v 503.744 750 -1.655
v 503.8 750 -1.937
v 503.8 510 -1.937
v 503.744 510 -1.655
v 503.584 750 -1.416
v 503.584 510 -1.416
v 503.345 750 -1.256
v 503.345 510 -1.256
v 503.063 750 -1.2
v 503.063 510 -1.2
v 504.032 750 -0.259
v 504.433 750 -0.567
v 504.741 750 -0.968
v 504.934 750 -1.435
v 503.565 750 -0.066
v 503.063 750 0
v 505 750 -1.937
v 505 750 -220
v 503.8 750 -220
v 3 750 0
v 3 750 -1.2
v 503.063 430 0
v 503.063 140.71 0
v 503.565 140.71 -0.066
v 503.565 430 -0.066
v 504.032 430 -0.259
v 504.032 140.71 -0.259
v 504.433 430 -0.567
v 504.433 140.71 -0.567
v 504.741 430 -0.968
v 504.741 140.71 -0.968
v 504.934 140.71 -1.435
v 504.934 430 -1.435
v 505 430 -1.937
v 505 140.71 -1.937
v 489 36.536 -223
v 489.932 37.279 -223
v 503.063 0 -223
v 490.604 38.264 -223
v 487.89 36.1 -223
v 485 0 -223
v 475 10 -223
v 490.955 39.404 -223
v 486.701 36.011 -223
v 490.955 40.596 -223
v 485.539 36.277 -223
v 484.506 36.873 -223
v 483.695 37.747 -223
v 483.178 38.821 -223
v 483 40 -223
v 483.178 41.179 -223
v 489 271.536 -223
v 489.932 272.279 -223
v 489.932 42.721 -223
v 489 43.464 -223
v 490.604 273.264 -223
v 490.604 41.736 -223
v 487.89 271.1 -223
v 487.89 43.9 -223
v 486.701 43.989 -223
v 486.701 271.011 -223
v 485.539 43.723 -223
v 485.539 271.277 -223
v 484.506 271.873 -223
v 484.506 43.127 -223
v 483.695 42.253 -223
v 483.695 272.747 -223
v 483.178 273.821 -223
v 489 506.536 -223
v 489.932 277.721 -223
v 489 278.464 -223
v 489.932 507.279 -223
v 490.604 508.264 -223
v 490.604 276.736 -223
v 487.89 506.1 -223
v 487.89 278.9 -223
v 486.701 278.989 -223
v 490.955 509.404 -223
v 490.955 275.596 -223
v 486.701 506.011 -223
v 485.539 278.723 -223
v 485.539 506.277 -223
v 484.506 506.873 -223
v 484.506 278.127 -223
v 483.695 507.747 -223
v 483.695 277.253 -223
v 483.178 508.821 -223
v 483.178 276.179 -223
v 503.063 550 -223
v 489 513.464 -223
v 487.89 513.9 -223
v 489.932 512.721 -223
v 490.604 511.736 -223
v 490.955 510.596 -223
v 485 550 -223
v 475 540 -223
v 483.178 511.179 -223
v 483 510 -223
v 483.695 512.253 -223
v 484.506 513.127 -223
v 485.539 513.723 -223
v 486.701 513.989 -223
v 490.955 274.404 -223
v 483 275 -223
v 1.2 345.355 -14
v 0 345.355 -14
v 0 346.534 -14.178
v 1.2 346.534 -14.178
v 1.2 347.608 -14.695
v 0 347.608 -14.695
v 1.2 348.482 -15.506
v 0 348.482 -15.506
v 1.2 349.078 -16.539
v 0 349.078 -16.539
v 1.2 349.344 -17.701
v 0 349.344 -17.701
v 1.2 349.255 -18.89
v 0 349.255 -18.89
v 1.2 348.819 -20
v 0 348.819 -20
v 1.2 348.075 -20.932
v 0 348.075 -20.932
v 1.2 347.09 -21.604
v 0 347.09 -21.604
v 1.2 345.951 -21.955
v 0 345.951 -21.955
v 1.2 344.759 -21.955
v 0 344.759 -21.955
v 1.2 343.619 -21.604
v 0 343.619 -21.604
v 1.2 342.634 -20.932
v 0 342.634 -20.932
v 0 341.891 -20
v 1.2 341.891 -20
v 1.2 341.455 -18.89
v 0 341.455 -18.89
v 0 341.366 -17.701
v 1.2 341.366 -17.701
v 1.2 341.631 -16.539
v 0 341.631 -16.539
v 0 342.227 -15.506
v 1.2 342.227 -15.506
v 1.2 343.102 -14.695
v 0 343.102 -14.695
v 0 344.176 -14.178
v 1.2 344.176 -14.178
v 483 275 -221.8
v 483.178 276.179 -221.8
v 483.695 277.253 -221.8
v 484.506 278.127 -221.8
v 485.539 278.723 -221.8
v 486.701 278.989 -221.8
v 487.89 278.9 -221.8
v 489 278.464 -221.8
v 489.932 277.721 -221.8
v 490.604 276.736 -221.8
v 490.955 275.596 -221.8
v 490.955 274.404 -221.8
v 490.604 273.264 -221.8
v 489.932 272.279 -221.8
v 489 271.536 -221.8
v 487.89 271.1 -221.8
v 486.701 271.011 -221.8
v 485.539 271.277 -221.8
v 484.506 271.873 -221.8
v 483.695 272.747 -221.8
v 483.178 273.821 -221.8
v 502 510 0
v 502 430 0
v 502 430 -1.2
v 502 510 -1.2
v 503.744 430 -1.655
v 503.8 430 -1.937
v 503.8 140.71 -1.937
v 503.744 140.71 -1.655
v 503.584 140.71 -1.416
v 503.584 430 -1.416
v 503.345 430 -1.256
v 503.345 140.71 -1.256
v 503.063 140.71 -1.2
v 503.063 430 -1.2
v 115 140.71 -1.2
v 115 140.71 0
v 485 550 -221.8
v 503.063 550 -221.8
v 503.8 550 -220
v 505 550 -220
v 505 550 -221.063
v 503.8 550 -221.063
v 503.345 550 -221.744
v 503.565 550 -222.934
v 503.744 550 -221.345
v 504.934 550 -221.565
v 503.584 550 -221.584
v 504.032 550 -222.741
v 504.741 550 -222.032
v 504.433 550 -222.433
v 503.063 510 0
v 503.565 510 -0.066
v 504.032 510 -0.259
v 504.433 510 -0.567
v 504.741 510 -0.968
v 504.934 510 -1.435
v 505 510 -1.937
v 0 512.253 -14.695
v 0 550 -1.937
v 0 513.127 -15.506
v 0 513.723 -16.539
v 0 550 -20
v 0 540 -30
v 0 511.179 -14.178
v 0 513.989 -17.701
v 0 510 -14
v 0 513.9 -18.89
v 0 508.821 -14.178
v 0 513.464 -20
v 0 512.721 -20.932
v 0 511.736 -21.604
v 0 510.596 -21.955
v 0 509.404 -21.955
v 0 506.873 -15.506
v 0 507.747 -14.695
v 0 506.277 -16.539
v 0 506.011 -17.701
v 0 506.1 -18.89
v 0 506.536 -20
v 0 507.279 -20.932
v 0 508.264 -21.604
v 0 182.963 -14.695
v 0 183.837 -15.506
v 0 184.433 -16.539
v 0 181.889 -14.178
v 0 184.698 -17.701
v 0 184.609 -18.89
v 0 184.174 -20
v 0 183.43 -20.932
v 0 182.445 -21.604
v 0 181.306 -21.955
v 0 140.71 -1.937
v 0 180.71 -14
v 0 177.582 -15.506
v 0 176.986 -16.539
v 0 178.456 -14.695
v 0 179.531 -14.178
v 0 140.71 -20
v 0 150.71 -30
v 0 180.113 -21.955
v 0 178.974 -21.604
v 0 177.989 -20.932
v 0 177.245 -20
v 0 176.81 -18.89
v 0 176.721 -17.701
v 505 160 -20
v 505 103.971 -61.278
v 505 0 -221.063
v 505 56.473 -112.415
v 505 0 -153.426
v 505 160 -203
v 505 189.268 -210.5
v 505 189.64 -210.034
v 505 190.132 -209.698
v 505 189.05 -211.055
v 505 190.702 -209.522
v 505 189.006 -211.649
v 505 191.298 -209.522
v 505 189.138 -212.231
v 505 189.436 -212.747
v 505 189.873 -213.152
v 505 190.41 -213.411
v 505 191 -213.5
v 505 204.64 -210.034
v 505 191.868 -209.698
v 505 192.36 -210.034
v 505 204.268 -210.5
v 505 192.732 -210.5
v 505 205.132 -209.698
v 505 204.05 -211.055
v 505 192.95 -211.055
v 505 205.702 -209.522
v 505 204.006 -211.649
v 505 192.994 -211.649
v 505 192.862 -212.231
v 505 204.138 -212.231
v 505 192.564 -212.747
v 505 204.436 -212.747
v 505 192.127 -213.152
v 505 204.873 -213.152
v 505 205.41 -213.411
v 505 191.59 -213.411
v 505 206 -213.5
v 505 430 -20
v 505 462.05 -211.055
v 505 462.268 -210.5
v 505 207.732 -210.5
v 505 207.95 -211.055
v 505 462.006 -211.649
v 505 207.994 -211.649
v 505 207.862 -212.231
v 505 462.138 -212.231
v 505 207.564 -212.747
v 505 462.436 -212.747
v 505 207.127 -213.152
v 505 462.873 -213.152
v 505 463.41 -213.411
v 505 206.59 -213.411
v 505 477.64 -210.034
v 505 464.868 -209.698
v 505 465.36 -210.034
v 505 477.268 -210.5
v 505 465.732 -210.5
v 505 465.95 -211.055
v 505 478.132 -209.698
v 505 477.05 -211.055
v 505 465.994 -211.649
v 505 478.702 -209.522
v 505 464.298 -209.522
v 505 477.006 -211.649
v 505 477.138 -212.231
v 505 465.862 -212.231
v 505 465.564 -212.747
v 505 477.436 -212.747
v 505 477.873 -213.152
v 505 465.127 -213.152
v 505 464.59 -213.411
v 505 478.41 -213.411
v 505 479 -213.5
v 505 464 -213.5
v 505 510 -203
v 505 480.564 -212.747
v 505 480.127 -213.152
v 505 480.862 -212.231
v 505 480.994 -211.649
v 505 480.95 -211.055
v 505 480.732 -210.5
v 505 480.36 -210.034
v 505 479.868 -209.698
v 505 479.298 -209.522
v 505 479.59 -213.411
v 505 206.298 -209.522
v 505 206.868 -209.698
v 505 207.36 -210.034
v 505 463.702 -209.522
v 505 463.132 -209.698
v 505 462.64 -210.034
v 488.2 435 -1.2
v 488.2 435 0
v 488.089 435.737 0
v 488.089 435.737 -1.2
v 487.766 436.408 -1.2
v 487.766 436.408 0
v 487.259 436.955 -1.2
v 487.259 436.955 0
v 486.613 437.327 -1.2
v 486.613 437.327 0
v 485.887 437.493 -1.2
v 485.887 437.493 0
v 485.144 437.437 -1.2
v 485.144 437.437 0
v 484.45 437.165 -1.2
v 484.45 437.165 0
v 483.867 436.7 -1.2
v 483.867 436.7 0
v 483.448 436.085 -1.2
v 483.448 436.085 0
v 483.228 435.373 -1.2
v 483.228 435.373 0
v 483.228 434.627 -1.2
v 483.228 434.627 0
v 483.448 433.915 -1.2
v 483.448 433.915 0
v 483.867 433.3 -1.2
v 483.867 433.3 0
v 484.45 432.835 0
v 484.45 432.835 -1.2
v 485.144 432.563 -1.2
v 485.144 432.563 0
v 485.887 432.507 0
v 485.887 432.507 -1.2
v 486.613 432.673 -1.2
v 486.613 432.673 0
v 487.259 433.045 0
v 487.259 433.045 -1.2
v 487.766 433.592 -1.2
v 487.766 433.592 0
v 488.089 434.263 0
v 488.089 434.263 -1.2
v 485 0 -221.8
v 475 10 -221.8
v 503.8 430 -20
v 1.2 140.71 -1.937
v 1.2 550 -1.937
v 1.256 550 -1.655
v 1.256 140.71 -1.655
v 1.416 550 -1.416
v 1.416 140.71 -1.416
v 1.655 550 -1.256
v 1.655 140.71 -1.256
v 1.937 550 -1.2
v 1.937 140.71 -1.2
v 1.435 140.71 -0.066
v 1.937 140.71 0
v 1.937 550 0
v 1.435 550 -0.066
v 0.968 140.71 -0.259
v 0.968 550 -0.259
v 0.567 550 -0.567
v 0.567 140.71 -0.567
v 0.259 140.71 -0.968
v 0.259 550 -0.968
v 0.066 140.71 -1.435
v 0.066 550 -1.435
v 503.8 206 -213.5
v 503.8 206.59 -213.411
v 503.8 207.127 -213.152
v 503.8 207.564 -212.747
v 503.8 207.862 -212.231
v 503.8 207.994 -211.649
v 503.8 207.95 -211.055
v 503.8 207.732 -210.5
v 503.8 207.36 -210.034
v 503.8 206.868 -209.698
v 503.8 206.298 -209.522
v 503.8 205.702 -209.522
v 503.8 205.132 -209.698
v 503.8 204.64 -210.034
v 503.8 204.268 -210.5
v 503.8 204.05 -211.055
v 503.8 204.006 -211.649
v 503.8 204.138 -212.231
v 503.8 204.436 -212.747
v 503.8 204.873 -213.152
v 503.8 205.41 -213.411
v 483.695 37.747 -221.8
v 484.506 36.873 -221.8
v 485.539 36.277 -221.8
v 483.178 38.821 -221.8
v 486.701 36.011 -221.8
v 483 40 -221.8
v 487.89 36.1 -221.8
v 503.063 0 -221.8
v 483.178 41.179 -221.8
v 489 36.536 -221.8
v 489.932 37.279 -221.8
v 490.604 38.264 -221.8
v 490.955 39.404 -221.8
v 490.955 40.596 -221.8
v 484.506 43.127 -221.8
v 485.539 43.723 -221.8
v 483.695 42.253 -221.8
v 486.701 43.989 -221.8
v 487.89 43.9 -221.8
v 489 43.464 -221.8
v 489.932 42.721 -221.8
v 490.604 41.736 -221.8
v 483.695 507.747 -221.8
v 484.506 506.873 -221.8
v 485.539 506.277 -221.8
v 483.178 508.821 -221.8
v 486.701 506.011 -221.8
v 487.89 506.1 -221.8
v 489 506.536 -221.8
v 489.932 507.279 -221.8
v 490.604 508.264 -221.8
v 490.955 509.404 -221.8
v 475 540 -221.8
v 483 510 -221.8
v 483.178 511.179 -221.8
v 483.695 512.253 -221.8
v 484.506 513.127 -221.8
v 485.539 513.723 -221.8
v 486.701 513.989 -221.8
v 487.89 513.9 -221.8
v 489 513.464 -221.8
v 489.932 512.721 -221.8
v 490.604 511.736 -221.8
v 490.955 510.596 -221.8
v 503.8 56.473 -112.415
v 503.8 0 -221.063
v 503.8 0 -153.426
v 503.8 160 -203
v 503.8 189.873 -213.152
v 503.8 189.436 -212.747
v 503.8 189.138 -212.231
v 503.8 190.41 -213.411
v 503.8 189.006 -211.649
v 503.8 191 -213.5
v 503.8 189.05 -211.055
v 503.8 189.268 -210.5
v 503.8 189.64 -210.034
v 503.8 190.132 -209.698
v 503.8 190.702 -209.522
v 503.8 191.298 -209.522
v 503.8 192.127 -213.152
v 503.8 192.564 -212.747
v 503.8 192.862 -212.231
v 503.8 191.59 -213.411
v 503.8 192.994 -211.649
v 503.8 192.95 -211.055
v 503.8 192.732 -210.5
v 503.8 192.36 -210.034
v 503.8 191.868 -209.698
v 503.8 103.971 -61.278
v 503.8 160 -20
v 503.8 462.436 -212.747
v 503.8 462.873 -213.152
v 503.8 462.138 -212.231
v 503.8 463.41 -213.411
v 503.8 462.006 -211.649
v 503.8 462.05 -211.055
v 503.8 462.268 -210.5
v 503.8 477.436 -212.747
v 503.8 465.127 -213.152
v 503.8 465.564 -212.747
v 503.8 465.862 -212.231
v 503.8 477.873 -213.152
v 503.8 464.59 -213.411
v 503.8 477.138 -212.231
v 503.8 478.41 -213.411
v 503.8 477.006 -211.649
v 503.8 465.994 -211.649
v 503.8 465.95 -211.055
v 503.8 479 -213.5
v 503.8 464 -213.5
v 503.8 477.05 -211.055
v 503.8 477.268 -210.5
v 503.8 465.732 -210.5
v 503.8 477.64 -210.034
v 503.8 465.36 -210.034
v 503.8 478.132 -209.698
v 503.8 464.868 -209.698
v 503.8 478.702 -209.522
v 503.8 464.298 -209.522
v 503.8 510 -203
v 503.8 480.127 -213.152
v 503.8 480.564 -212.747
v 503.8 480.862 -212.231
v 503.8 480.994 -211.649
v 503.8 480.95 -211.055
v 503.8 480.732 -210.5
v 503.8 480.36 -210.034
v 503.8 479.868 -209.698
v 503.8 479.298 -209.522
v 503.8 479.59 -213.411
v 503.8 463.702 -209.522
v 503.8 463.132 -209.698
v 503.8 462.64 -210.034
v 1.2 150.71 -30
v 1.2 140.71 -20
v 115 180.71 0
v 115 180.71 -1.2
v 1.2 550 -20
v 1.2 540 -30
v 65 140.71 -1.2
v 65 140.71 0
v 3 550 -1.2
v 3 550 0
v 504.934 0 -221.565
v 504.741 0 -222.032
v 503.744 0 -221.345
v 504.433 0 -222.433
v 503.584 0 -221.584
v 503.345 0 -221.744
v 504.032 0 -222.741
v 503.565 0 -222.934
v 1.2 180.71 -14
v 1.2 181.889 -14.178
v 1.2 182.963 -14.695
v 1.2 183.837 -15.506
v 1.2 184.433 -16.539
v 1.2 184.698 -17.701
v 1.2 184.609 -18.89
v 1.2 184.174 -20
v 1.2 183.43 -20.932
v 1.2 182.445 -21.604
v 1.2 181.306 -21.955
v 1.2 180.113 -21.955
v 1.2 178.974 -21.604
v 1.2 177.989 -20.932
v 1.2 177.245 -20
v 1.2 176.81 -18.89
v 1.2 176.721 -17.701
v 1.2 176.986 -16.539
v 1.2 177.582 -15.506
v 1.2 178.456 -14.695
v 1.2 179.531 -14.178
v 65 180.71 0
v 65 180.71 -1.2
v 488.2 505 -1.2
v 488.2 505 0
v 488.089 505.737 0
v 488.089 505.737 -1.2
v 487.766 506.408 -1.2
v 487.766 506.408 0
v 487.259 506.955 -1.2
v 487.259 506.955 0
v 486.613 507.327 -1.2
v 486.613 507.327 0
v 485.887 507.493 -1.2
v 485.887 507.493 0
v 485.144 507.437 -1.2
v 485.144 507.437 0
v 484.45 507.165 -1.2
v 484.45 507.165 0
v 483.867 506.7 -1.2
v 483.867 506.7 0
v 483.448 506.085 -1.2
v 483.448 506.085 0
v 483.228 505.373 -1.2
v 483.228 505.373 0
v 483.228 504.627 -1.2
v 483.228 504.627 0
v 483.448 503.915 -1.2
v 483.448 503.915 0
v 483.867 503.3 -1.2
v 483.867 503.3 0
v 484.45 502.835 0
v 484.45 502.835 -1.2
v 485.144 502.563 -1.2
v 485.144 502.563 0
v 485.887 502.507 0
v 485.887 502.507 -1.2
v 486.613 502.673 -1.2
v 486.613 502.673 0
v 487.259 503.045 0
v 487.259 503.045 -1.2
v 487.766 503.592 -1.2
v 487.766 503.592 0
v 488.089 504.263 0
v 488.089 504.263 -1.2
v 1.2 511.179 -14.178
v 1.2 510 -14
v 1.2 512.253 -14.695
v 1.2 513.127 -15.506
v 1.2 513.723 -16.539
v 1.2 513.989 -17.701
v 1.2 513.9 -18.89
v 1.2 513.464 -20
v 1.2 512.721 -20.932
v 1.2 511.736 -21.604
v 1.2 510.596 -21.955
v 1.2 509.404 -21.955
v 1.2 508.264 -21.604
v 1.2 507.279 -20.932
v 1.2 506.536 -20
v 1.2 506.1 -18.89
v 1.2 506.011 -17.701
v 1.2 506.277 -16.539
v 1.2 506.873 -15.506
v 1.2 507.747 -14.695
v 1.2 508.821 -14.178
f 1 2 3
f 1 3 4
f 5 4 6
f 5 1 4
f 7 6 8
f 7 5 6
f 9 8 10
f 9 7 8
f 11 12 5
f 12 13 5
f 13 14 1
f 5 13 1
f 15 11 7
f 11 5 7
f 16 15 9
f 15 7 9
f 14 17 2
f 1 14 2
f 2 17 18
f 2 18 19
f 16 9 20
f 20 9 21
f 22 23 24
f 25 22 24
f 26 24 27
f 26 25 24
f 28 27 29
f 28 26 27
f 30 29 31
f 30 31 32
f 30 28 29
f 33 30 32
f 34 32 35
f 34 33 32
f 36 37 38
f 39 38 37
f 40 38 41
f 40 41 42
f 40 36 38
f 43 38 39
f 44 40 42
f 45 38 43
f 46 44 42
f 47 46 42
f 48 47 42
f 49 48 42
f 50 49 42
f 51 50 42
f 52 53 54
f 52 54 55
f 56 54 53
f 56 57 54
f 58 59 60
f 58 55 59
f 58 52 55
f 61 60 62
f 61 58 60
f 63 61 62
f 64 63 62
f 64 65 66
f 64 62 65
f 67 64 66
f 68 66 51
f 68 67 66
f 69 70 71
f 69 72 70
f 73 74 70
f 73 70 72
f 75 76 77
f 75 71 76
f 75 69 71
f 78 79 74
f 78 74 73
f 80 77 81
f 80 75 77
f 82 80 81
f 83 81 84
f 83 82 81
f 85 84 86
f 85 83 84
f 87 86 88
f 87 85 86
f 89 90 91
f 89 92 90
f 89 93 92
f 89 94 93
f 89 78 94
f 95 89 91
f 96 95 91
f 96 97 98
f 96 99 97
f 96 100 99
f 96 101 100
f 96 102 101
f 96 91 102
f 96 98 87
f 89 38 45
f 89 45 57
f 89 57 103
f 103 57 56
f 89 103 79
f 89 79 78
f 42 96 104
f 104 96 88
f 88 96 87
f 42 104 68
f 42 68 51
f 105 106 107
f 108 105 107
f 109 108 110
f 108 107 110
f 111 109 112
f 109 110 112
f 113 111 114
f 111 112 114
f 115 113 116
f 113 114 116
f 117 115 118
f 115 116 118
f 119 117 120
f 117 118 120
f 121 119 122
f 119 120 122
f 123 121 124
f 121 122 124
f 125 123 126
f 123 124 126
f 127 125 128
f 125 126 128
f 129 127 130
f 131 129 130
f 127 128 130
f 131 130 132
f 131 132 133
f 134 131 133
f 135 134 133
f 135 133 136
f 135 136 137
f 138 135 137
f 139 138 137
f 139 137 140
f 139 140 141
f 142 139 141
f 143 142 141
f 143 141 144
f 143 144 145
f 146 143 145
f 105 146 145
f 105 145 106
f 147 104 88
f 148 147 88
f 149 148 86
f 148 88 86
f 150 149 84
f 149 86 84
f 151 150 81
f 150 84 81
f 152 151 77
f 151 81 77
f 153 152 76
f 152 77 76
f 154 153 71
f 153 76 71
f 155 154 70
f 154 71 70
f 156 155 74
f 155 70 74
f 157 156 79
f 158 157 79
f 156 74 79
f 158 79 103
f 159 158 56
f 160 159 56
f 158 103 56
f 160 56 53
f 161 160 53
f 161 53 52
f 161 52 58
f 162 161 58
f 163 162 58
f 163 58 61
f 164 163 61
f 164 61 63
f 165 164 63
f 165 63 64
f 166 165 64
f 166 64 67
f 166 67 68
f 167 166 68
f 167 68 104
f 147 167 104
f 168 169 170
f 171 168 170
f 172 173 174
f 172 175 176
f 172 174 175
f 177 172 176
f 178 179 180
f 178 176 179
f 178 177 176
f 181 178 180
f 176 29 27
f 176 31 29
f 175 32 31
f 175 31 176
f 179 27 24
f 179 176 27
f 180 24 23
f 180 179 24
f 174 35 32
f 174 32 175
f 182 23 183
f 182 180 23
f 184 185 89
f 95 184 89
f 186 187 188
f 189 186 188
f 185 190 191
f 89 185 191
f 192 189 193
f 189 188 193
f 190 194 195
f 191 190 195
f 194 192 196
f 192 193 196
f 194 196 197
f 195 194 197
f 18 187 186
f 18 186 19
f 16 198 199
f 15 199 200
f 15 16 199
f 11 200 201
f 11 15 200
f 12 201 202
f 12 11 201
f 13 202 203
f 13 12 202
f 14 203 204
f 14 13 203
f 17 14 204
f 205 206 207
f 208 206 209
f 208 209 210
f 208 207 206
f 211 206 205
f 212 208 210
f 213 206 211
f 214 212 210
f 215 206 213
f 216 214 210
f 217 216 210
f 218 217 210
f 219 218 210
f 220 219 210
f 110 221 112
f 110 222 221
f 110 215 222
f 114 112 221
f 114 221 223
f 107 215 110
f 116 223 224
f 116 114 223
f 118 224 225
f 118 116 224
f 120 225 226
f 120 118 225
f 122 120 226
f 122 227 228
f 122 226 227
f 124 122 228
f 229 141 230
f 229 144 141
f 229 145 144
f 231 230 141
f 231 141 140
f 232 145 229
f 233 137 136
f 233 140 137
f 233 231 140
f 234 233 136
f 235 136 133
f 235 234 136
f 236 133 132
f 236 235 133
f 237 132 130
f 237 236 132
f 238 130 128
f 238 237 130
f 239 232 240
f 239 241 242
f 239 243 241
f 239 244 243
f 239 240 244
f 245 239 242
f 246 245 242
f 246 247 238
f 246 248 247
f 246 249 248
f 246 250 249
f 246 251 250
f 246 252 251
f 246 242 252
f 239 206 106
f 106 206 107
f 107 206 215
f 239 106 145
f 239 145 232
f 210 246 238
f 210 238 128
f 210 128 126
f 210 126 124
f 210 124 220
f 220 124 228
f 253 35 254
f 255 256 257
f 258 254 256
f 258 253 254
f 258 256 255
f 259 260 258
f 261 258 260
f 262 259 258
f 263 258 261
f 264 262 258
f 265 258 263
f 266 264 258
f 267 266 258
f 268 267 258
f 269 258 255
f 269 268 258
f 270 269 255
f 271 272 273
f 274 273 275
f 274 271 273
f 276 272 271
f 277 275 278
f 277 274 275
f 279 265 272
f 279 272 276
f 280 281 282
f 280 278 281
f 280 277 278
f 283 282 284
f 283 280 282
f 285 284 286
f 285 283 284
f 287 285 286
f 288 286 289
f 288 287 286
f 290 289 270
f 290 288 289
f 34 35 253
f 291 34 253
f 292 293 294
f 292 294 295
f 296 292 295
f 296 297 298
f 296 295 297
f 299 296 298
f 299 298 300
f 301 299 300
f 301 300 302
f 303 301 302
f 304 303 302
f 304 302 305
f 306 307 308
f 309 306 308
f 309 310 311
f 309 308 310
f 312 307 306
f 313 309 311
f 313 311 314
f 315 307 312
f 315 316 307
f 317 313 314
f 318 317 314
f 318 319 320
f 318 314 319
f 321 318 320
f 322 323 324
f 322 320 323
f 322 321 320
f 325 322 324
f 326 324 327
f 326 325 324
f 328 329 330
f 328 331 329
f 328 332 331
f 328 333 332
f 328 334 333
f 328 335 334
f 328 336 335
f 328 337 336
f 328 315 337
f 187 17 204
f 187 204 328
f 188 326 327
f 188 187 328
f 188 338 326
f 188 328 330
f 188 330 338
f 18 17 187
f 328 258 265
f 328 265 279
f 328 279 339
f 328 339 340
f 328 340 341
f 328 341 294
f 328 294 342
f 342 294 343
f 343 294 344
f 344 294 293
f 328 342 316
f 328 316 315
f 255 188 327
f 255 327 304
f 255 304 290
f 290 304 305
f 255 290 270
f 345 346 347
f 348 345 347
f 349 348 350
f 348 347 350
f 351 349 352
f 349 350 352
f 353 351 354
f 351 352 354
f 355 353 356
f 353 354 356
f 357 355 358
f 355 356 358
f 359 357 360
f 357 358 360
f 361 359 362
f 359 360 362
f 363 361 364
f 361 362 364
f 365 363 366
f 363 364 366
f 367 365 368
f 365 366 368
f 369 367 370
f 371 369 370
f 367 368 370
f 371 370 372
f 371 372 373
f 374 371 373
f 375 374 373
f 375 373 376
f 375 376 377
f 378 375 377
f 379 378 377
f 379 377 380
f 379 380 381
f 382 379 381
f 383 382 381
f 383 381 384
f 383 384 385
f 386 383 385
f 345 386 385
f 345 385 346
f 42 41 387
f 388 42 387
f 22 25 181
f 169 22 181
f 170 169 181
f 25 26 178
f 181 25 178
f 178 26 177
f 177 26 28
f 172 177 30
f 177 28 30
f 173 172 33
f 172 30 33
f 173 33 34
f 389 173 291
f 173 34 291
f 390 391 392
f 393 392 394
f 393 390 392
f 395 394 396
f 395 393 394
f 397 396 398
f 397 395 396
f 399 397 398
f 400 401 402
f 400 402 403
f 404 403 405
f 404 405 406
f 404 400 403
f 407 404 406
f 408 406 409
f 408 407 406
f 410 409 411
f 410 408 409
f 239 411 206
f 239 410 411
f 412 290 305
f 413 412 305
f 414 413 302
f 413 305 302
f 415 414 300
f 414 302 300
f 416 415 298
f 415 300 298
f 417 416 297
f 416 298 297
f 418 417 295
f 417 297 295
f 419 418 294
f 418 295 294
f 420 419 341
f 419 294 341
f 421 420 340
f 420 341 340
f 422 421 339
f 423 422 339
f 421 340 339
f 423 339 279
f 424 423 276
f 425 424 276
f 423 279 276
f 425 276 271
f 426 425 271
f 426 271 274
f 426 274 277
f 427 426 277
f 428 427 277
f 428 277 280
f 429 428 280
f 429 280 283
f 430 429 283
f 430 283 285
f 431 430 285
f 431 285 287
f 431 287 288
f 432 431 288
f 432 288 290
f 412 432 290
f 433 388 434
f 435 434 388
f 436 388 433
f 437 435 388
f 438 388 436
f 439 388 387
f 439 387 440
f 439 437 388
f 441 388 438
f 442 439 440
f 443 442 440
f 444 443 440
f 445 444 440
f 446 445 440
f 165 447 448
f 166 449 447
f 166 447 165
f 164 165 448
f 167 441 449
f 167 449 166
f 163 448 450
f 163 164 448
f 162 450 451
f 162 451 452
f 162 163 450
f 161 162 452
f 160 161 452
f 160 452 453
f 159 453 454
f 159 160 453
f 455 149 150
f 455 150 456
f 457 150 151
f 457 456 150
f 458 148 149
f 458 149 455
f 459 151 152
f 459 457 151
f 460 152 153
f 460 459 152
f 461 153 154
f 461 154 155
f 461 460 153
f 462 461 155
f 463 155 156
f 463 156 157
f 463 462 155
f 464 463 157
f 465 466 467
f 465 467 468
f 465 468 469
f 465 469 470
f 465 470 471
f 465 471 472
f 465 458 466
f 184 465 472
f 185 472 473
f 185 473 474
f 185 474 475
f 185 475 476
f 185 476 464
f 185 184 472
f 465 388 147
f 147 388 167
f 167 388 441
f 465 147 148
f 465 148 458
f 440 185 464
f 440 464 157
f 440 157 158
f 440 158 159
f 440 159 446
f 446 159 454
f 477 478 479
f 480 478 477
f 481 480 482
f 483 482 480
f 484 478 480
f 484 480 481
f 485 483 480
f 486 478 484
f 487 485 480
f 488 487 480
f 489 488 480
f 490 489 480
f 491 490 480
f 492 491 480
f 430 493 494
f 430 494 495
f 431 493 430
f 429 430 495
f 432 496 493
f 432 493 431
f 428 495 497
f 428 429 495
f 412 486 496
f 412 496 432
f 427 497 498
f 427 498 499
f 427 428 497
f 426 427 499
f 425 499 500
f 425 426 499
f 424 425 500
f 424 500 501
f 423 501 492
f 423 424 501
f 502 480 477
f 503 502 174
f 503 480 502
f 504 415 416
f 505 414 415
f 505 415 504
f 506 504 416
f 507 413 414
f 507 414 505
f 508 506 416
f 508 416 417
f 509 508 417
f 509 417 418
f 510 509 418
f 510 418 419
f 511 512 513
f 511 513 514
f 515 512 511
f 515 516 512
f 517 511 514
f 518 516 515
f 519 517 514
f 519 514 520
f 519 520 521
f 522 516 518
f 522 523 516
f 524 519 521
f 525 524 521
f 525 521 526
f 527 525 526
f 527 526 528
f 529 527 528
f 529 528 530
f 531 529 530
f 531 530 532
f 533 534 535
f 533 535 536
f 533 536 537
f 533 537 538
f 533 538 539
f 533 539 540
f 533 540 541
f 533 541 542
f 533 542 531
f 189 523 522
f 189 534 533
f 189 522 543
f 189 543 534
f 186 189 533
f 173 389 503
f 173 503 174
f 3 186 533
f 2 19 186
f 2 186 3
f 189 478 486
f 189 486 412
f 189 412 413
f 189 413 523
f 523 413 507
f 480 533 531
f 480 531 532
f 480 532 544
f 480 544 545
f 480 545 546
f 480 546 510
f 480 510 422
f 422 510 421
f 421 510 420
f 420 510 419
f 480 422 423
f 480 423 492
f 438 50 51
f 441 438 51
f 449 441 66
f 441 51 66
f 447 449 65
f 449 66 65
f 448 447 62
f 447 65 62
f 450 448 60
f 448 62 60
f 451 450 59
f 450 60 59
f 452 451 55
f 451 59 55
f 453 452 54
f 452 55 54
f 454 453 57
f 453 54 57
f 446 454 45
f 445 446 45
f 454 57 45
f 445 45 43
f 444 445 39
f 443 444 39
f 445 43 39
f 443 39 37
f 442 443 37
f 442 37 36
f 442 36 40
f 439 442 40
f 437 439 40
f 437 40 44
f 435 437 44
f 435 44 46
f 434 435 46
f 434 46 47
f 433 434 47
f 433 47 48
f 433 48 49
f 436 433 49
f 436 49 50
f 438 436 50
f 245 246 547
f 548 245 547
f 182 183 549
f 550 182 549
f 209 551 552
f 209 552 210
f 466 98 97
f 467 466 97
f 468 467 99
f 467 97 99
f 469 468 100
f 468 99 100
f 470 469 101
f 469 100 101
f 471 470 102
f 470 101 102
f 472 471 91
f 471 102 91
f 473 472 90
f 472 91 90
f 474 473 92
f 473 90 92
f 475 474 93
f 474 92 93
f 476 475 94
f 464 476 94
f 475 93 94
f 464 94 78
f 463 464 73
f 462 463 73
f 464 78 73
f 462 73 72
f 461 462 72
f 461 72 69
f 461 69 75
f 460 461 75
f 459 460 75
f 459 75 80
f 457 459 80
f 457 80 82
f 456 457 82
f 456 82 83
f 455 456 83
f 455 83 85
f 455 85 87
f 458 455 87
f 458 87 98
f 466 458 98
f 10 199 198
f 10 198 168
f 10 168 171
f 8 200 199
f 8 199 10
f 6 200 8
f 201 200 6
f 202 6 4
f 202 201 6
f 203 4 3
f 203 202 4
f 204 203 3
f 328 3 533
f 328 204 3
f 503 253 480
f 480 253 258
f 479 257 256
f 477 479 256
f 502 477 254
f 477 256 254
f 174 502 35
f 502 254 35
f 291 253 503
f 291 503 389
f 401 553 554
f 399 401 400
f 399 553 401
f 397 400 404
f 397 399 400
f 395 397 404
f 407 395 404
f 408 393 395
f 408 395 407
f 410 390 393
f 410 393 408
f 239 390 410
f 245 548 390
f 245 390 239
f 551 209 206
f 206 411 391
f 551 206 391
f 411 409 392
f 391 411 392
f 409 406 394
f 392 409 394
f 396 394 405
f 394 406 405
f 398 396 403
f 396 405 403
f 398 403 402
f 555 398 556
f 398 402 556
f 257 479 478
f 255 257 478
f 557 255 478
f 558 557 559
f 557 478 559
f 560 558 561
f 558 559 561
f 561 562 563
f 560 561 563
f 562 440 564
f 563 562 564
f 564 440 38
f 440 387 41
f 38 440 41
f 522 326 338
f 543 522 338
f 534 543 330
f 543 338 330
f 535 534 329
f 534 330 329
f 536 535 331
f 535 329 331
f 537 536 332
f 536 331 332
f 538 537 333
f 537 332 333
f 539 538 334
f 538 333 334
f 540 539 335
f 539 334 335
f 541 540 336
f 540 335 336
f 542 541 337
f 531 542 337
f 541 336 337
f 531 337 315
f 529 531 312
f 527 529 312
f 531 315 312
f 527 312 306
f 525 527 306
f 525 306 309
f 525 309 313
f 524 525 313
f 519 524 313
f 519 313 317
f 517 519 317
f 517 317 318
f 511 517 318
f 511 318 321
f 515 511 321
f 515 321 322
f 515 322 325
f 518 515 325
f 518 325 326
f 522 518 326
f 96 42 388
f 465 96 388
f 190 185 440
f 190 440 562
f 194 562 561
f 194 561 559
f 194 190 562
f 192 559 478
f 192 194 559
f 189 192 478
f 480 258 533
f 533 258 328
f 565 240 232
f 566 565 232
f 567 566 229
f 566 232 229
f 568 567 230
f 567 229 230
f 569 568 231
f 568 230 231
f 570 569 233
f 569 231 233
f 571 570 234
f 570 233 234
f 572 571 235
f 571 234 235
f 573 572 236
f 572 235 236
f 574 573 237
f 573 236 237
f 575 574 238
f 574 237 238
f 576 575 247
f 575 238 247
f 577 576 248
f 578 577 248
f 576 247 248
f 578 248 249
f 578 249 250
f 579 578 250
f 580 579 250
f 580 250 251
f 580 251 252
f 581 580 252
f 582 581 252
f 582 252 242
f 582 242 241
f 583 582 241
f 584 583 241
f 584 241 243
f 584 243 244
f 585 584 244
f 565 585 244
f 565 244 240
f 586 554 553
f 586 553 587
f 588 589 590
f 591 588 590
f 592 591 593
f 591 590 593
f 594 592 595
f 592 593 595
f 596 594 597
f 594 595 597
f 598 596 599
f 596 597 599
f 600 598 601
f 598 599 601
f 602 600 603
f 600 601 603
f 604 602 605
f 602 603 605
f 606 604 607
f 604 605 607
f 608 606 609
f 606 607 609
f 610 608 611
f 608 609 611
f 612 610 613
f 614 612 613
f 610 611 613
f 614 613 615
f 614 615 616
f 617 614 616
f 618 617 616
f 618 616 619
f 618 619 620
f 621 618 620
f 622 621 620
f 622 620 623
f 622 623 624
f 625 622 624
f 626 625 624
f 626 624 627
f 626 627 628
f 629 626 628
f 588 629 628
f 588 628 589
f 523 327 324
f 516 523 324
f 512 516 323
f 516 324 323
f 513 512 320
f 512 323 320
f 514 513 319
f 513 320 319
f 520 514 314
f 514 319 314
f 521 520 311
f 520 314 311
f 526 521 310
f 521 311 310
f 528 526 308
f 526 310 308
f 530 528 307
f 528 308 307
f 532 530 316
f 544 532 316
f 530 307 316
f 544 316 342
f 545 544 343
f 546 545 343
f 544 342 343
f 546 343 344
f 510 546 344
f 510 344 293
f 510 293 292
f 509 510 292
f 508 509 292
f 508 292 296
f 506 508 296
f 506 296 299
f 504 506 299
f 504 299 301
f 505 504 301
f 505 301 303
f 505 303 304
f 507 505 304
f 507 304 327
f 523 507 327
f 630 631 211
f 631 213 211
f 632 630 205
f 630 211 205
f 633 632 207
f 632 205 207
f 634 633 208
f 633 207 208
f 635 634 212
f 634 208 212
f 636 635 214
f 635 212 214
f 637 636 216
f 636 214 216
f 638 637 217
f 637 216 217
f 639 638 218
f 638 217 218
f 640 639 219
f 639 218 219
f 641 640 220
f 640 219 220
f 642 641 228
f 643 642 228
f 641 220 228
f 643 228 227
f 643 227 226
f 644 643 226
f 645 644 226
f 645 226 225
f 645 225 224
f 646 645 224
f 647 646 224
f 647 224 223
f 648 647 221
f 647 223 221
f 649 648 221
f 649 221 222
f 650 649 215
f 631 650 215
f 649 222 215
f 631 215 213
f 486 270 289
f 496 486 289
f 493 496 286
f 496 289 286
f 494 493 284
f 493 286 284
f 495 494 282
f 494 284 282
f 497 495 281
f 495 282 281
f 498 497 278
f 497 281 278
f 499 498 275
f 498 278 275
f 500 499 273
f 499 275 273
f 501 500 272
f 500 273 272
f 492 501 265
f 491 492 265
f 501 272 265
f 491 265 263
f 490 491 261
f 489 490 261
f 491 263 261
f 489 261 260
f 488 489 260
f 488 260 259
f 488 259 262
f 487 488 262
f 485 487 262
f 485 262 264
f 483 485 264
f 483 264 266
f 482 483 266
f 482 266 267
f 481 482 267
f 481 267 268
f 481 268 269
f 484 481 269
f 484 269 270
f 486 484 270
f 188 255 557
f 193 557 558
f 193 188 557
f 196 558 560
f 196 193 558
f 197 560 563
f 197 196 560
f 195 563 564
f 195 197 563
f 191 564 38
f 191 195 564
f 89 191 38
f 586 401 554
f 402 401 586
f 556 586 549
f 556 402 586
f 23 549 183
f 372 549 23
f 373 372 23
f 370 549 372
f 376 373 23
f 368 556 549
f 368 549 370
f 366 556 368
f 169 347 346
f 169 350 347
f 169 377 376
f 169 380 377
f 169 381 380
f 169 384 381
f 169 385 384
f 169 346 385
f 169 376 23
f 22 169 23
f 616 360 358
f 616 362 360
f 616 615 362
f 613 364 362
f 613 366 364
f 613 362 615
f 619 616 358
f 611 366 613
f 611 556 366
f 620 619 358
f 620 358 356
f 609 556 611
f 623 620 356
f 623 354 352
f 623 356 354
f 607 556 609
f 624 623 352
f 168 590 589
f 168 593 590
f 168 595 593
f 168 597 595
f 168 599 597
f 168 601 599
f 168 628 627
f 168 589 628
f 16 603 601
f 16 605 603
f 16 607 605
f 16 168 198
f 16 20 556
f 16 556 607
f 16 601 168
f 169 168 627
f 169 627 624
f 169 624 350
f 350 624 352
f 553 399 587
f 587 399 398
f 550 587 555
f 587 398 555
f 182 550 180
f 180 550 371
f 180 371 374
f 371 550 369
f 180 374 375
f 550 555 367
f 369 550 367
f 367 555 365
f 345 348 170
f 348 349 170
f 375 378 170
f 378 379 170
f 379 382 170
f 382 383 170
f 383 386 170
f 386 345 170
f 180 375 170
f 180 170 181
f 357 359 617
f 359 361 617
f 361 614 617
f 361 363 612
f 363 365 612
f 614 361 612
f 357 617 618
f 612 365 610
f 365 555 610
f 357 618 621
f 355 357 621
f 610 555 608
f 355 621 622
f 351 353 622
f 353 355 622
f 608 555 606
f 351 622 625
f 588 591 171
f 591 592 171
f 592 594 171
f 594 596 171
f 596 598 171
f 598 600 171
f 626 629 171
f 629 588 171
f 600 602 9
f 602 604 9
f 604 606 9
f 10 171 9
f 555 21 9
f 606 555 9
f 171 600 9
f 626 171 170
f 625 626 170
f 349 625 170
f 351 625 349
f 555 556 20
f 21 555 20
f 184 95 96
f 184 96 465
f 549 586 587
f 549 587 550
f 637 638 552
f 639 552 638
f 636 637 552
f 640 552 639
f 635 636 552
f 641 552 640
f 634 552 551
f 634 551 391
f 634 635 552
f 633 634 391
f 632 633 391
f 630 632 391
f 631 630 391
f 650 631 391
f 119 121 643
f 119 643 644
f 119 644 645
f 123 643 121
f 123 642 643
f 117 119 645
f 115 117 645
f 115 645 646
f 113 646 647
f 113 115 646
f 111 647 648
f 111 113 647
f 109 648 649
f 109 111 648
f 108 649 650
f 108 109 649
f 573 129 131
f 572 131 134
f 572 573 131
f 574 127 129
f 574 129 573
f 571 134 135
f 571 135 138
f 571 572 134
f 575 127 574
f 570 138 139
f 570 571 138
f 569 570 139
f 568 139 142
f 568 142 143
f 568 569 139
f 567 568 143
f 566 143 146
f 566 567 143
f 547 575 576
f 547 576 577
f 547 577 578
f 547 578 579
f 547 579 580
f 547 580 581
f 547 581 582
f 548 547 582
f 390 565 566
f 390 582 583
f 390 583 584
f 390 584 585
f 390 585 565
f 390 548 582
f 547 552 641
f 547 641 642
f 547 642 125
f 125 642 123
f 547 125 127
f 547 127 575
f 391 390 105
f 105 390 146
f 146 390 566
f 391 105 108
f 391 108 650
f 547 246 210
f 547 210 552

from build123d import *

# Parameters (mm, degrees)
SKETCH_1_W                       = 505
SKETCH_1_H                       = 750
SM_BASE_FLANGE_1_DEPTH           = 1.2
SM_EDGE_FLANGE_1_STRIP_W         = 6.2732
SM_EDGE_FLANGE_1_STRIP_H         = 1.2
SM_EDGE_FLANGE_1_STRIP_CUT_DEPTH = 750
SM_EDGE_FLANGE_1_DEPTH           = 750
CUT_EXTRUDE_1_DEPTH              = 932.264731427
SM_EDGE_FLANGE_2_STRIP_W         = 6.2732
SM_EDGE_FLANGE_2_STRIP_H         = 1.2
SM_EDGE_FLANGE_2_STRIP_CUT_DEPTH = 750
SM_EDGE_FLANGE_2_DEPTH           = 750
SM_EDGE_FLANGE_3_STRIP_W         = 6.2732
SM_EDGE_FLANGE_3_STRIP_H         = 1.2
SM_EDGE_FLANGE_3_STRIP_CUT_DEPTH = 609.290401588
SM_EDGE_FLANGE_3_DEPTH           = 609.290401588
SKETCH_16_W                      = 41.475289024
SKETCH_16_H                      = 200
CUT_EXTRUDE_2_DEPTH              = 932.264731427
SKETCH_17_W                      = 35.547342431
SKETCH_17_H                      = 200
CUT_EXTRUDE_3_DEPTH              = 932.264731427
CHAMFER_1_SIZE                   = 10
SKETCH_19_W                      = 183
SKETCH_19_H                      = 350
CUT_EXTRUDE_4_DEPTH              = 10
SKETCH_20_W                      = 20
SKETCH_20_H                      = 80
CUT_EXTRUDE_5_DEPTH              = 3
CUT_EXTRUDE_6_REACH              = 933.265
SKETCH_21_R                      = 2.5
CUT_EXTRUDE_7_REACH              = 933.265
SKETCH_22_R                      = 2
SKETCH_23_R                      = 4
CUT_EXTRUDE_8_DEPTH              = 10
CUT_EXTRUDE_9_REACH              = 933.265
SKETCH_24_R                      = 4
SKETCH_25_W                      = 50
SKETCH_25_H                      = 40
CUT_EXTRUDE_10_DEPTH             = 10


# Sheet-metal steps are written as plain solids
with BuildPart() as part:
    # Sketch 1 → Базовая кромка1 (new body)
    with BuildSketch(Plane.XY):
        with Locations((252.5, 375)):
            Rectangle(SKETCH_1_W, SKETCH_1_H)
    extrude(amount=-SM_BASE_FLANGE_1_DEPTH)

    # Ребро-кромка1 strip (across the edge) → Ребро-кромка1 strip cut (cut)
    with BuildSketch(Plane(origin=(505, 750, -1.2), x_dir=(-1, 0, 0), z_dir=(0, -1, 0))):
        with Locations((-1.2, -0.6)):
            Rectangle(SM_EDGE_FLANGE_1_STRIP_W, SM_EDGE_FLANGE_1_STRIP_H)
    extrude(amount=SM_EDGE_FLANGE_1_STRIP_CUT_DEPTH, mode=Mode.SUBTRACT)

    # Ребро-кромка1 section (across the edge) → Ребро-кромка1 (add)
    with BuildSketch(Plane(origin=(505, 750, -1.2), x_dir=(-1, 0, 0), z_dir=(0, -1, 0))):
        with BuildLine():
            Line((0, 0.7366), (0, 221.8))
            Line((0, 221.8), (1.2, 221.8))
            Line((1.2, 221.8), (1.2, 0.7366))
            ThreePointArc((1.2, 0.7366), (1.415745145, 0.215745145), (1.9366, 0))
            Line((1.9366, 0), (1.9366, -1.2))
            ThreePointArc((1.9366, -1.2), (0.567217008, -0.632782992), (0, 0.7366))
        make_face()
    extrude(amount=SM_EDGE_FLANGE_1_DEPTH)

    # Эскиз9 → Вырез-Вытянуть1 (cut, through all)
    with BuildSketch(Plane(origin=(505, 0, 0), x_dir=(0, 0, -1), z_dir=(1, 0, 0))):
        with BuildLine():
            Line((1.9366, 140.709598412), (-18.72453306, 140.709598412))
            Line((-18.72453306, 140.709598412), (-18.72453306, 150.079036589))
            ThreePointArc((-18.72453306, 150.079036589), (-305.67985666, -510.169358417), (1.9366, 140.709598412))
        make_face()
    extrude(amount=-CUT_EXTRUDE_1_DEPTH, mode=Mode.SUBTRACT)

    # Ребро-кромка2 strip (across the edge) → Ребро-кромка2 strip cut (cut)
    with BuildSketch(Plane(origin=(503.8, 750, -223), x_dir=(0, 0, 1), z_dir=(0, -1, 0))):
        with Locations((-1.2, -0.6)):
            Rectangle(SM_EDGE_FLANGE_2_STRIP_W, SM_EDGE_FLANGE_2_STRIP_H)
    extrude(amount=SM_EDGE_FLANGE_2_STRIP_CUT_DEPTH, mode=Mode.SUBTRACT)

    # Ребро-кромка2 section (across the edge) → Ребро-кромка2 (add)
    with BuildSketch(Plane(origin=(503.8, 750, -223), x_dir=(0, 0, 1), z_dir=(0, -1, 0))):
        with BuildLine():
            Line((0, 0.7366), (0, 28.8))
            Line((0, 28.8), (1.2, 28.8))
            Line((1.2, 28.8), (1.2, 0.7366))
            ThreePointArc((1.2, 0.7366), (1.415745145, 0.215745145), (1.9366, 0))
            Line((1.9366, 0), (1.9366, -1.2))
            ThreePointArc((1.9366, -1.2), (0.567217008, -0.632782992), (0, 0.7366))
        make_face()
    extrude(amount=SM_EDGE_FLANGE_2_DEPTH)

    # Ребро-кромка3 strip (across the edge) → Ребро-кромка3 strip cut (cut)
    with BuildSketch(Plane(origin=(0, 140.709598412, -1.2), x_dir=(1, 0, 0), z_dir=(0, 1, 0))):
        with Locations((-1.2, -0.6)):
            Rectangle(SM_EDGE_FLANGE_3_STRIP_W, SM_EDGE_FLANGE_3_STRIP_H)
    extrude(amount=SM_EDGE_FLANGE_3_STRIP_CUT_DEPTH, mode=Mode.SUBTRACT)

    # Ребро-кромка3 section (across the edge) → Ребро-кромка3 (add)
    with BuildSketch(Plane(origin=(0, 140.709598412, -1.2), x_dir=(1, 0, 0), z_dir=(0, 1, 0))):
        with BuildLine():
            Line((0, 0.7366), (0, 28.8))
            Line((0, 28.8), (1.2, 28.8))
            Line((1.2, 28.8), (1.2, 0.7366))
            ThreePointArc((1.2, 0.7366), (1.415745145, 0.215745145), (1.9366, 0))
            Line((1.9366, 0), (1.9366, -1.2))
            ThreePointArc((1.9366, -1.2), (0.567217008, -0.632782992), (0, 0.7366))
        make_face()
    extrude(amount=SM_EDGE_FLANGE_3_DEPTH)

    # Эскиз16 → Вырез-Вытянуть2 (cut, through all)
    with BuildSketch(Plane(origin=(505, 0, 0), x_dir=(0, 0, -1), z_dir=(1, 0, 0))):
        with Locations((240.737644512, 650)):
            Rectangle(SKETCH_16_W, SKETCH_16_H)
    extrude(amount=-CUT_EXTRUDE_2_DEPTH, mode=Mode.SUBTRACT)

    # Эскиз17 → Вырез-Вытянуть3 (cut, through all)
    with BuildSketch(Plane.XY):
        with Locations((-14.773671216, 650)):
            Rectangle(SKETCH_17_W, SKETCH_17_H)
    extrude(amount=-CUT_EXTRUDE_3_DEPTH, mode=Mode.SUBTRACT)

    # Фаска1
    chamfer_1_edges = [part.edges().sort_by_distance(p)[0] for p in [
        (0.6, 140.709598412, -30),
        (475, 550, -222.4),
        (0.6, 550, -30),
        (475, 0, -222.4),
    ]]
    chamfer(chamfer_1_edges, length=CHAMFER_1_SIZE)

    # Эскиз19 → Вырез-Вытянуть4 (cut)
    with BuildSketch(Plane(origin=(505, 0, 0), x_dir=(0, 0, -1), z_dir=(1, 0, 0))):
        with Locations((111.5, 335)):
            Rectangle(SKETCH_19_W, SKETCH_19_H)
    extrude(amount=-CUT_EXTRUDE_4_DEPTH, mode=Mode.SUBTRACT)

    # Эскиз20 → Вырез-Вытянуть5 (cut)
    with BuildSketch(Plane(origin=(505, 0, 0), x_dir=(0, 0, -1), z_dir=(1, 0, 0))):
        with Locations((10, 470)):
            Rectangle(SKETCH_20_W, SKETCH_20_H)
    extrude(amount=-CUT_EXTRUDE_5_DEPTH, mode=Mode.SUBTRACT)

    # Эскиз21 → Вырез-Вытянуть6 (cut, up to next)
    with BuildSketch(Plane.XY, mode=Mode.PRIVATE) as cut_extrude_6_sk1:
        with Locations((485.7, 505)):
            Circle(SKETCH_21_R)
    cut_extrude_6_tool1 = extrude(cut_extrude_6_sk1.sketch, amount=-CUT_EXTRUDE_6_REACH, mode=Mode.PRIVATE) & part.part
    # Эскиз21 → Вырез-Вытянуть6 (cut, up to next)
    with BuildSketch(Plane.XY, mode=Mode.PRIVATE) as cut_extrude_6_sk2:
        with Locations((485.7, 435)):
            Circle(SKETCH_21_R)
    cut_extrude_6_tool2 = extrude(cut_extrude_6_sk2.sketch, amount=-CUT_EXTRUDE_6_REACH, mode=Mode.PRIVATE) & part.part
    add(cut_extrude_6_tool1.solids().sort_by_distance((485.7, 505, 0))[0], mode=Mode.SUBTRACT)
    add(cut_extrude_6_tool2.solids().sort_by_distance((485.7, 435, 0))[0], mode=Mode.SUBTRACT)

    # Эскиз22 → Вырез-Вытянуть7 (cut, up to next)
    with BuildSketch(Plane(origin=(505, 0, 0), x_dir=(0, 0, -1), z_dir=(1, 0, 0)), mode=Mode.PRIVATE) as cut_extrude_7_sk1:
        with Locations((211.5, 479)):
            Circle(SKETCH_22_R)
    cut_extrude_7_tool1 = extrude(cut_extrude_7_sk1.sketch, amount=-CUT_EXTRUDE_7_REACH, mode=Mode.PRIVATE) & part.part
    # Эскиз22 → Вырез-Вытянуть7 (cut, up to next)
    with BuildSketch(Plane(origin=(505, 0, 0), x_dir=(0, 0, -1), z_dir=(1, 0, 0)), mode=Mode.PRIVATE) as cut_extrude_7_sk2:
        with Locations((211.5, 464)):
            Circle(SKETCH_22_R)
    cut_extrude_7_tool2 = extrude(cut_extrude_7_sk2.sketch, amount=-CUT_EXTRUDE_7_REACH, mode=Mode.PRIVATE) & part.part
    # Эскиз22 → Вырез-Вытянуть7 (cut, up to next)
    with BuildSketch(Plane(origin=(505, 0, 0), x_dir=(0, 0, -1), z_dir=(1, 0, 0)), mode=Mode.PRIVATE) as cut_extrude_7_sk3:
        with Locations((211.5, 206)):
            Circle(SKETCH_22_R)
    cut_extrude_7_tool3 = extrude(cut_extrude_7_sk3.sketch, amount=-CUT_EXTRUDE_7_REACH, mode=Mode.PRIVATE) & part.part
    # Эскиз22 → Вырез-Вытянуть7 (cut, up to next)
    with BuildSketch(Plane(origin=(505, 0, 0), x_dir=(0, 0, -1), z_dir=(1, 0, 0)), mode=Mode.PRIVATE) as cut_extrude_7_sk4:
        with Locations((211.5, 191)):
            Circle(SKETCH_22_R)
    cut_extrude_7_tool4 = extrude(cut_extrude_7_sk4.sketch, amount=-CUT_EXTRUDE_7_REACH, mode=Mode.PRIVATE) & part.part
    add(cut_extrude_7_tool1.solids().sort_by_distance((505, 479, -211.5))[0], mode=Mode.SUBTRACT)
    add(cut_extrude_7_tool2.solids().sort_by_distance((505, 464, -211.5))[0], mode=Mode.SUBTRACT)
    add(cut_extrude_7_tool3.solids().sort_by_distance((505, 206, -211.5))[0], mode=Mode.SUBTRACT)
    add(cut_extrude_7_tool4.solids().sort_by_distance((505, 191, -211.5))[0], mode=Mode.SUBTRACT)

    # Эскиз23 → Вырез-Вытянуть8 (cut)
    with BuildSketch(Plane(origin=(0, 0, -223), x_dir=(-1, 0, 0), z_dir=(0, 0, -1))):
        with Locations((-487, 510)):
            Circle(SKETCH_23_R)
        with Locations((-487, 275)):
            Circle(SKETCH_23_R)
        with Locations((-487, 40)):
            Circle(SKETCH_23_R)
    extrude(amount=-CUT_EXTRUDE_8_DEPTH, mode=Mode.SUBTRACT)

    # Эскиз24 → Вырез-Вытянуть9 (cut, up to next)
    with BuildSketch(Plane.ZY, mode=Mode.PRIVATE) as cut_extrude_9_sk1:
        with Locations((-18, 510)):
            Circle(SKETCH_24_R)
    cut_extrude_9_tool1 = extrude(cut_extrude_9_sk1.sketch, amount=-CUT_EXTRUDE_9_REACH, mode=Mode.PRIVATE) & part.part
    # Эскиз24 → Вырез-Вытянуть9 (cut, up to next)
    with BuildSketch(Plane.ZY, mode=Mode.PRIVATE) as cut_extrude_9_sk2:
        with Locations((-18, 345.354799206)):
            Circle(SKETCH_24_R)
    cut_extrude_9_tool2 = extrude(cut_extrude_9_sk2.sketch, amount=-CUT_EXTRUDE_9_REACH, mode=Mode.PRIVATE) & part.part
    # Эскиз24 → Вырез-Вытянуть9 (cut, up to next)
    with BuildSketch(Plane.ZY, mode=Mode.PRIVATE) as cut_extrude_9_sk3:
        with Locations((-18, 180.709598412)):
            Circle(SKETCH_24_R)
    cut_extrude_9_tool3 = extrude(cut_extrude_9_sk3.sketch, amount=-CUT_EXTRUDE_9_REACH, mode=Mode.PRIVATE) & part.part
    add(cut_extrude_9_tool1.solids().sort_by_distance((0, 510, -18))[0], mode=Mode.SUBTRACT)
    add(cut_extrude_9_tool2.solids().sort_by_distance((0, 345.354799, -18))[0], mode=Mode.SUBTRACT)
    add(cut_extrude_9_tool3.solids().sort_by_distance((0, 180.709598, -18))[0], mode=Mode.SUBTRACT)

    # Эскиз25 → Вырез-Вытянуть10 (cut)
    with BuildSketch(Plane.XY):
        with Locations((90, 160.709598412)):
            Rectangle(SKETCH_25_W, SKETCH_25_H)
    extrude(amount=-CUT_EXTRUDE_10_DEPTH, mode=Mode.SUBTRACT)


solid = part.part
